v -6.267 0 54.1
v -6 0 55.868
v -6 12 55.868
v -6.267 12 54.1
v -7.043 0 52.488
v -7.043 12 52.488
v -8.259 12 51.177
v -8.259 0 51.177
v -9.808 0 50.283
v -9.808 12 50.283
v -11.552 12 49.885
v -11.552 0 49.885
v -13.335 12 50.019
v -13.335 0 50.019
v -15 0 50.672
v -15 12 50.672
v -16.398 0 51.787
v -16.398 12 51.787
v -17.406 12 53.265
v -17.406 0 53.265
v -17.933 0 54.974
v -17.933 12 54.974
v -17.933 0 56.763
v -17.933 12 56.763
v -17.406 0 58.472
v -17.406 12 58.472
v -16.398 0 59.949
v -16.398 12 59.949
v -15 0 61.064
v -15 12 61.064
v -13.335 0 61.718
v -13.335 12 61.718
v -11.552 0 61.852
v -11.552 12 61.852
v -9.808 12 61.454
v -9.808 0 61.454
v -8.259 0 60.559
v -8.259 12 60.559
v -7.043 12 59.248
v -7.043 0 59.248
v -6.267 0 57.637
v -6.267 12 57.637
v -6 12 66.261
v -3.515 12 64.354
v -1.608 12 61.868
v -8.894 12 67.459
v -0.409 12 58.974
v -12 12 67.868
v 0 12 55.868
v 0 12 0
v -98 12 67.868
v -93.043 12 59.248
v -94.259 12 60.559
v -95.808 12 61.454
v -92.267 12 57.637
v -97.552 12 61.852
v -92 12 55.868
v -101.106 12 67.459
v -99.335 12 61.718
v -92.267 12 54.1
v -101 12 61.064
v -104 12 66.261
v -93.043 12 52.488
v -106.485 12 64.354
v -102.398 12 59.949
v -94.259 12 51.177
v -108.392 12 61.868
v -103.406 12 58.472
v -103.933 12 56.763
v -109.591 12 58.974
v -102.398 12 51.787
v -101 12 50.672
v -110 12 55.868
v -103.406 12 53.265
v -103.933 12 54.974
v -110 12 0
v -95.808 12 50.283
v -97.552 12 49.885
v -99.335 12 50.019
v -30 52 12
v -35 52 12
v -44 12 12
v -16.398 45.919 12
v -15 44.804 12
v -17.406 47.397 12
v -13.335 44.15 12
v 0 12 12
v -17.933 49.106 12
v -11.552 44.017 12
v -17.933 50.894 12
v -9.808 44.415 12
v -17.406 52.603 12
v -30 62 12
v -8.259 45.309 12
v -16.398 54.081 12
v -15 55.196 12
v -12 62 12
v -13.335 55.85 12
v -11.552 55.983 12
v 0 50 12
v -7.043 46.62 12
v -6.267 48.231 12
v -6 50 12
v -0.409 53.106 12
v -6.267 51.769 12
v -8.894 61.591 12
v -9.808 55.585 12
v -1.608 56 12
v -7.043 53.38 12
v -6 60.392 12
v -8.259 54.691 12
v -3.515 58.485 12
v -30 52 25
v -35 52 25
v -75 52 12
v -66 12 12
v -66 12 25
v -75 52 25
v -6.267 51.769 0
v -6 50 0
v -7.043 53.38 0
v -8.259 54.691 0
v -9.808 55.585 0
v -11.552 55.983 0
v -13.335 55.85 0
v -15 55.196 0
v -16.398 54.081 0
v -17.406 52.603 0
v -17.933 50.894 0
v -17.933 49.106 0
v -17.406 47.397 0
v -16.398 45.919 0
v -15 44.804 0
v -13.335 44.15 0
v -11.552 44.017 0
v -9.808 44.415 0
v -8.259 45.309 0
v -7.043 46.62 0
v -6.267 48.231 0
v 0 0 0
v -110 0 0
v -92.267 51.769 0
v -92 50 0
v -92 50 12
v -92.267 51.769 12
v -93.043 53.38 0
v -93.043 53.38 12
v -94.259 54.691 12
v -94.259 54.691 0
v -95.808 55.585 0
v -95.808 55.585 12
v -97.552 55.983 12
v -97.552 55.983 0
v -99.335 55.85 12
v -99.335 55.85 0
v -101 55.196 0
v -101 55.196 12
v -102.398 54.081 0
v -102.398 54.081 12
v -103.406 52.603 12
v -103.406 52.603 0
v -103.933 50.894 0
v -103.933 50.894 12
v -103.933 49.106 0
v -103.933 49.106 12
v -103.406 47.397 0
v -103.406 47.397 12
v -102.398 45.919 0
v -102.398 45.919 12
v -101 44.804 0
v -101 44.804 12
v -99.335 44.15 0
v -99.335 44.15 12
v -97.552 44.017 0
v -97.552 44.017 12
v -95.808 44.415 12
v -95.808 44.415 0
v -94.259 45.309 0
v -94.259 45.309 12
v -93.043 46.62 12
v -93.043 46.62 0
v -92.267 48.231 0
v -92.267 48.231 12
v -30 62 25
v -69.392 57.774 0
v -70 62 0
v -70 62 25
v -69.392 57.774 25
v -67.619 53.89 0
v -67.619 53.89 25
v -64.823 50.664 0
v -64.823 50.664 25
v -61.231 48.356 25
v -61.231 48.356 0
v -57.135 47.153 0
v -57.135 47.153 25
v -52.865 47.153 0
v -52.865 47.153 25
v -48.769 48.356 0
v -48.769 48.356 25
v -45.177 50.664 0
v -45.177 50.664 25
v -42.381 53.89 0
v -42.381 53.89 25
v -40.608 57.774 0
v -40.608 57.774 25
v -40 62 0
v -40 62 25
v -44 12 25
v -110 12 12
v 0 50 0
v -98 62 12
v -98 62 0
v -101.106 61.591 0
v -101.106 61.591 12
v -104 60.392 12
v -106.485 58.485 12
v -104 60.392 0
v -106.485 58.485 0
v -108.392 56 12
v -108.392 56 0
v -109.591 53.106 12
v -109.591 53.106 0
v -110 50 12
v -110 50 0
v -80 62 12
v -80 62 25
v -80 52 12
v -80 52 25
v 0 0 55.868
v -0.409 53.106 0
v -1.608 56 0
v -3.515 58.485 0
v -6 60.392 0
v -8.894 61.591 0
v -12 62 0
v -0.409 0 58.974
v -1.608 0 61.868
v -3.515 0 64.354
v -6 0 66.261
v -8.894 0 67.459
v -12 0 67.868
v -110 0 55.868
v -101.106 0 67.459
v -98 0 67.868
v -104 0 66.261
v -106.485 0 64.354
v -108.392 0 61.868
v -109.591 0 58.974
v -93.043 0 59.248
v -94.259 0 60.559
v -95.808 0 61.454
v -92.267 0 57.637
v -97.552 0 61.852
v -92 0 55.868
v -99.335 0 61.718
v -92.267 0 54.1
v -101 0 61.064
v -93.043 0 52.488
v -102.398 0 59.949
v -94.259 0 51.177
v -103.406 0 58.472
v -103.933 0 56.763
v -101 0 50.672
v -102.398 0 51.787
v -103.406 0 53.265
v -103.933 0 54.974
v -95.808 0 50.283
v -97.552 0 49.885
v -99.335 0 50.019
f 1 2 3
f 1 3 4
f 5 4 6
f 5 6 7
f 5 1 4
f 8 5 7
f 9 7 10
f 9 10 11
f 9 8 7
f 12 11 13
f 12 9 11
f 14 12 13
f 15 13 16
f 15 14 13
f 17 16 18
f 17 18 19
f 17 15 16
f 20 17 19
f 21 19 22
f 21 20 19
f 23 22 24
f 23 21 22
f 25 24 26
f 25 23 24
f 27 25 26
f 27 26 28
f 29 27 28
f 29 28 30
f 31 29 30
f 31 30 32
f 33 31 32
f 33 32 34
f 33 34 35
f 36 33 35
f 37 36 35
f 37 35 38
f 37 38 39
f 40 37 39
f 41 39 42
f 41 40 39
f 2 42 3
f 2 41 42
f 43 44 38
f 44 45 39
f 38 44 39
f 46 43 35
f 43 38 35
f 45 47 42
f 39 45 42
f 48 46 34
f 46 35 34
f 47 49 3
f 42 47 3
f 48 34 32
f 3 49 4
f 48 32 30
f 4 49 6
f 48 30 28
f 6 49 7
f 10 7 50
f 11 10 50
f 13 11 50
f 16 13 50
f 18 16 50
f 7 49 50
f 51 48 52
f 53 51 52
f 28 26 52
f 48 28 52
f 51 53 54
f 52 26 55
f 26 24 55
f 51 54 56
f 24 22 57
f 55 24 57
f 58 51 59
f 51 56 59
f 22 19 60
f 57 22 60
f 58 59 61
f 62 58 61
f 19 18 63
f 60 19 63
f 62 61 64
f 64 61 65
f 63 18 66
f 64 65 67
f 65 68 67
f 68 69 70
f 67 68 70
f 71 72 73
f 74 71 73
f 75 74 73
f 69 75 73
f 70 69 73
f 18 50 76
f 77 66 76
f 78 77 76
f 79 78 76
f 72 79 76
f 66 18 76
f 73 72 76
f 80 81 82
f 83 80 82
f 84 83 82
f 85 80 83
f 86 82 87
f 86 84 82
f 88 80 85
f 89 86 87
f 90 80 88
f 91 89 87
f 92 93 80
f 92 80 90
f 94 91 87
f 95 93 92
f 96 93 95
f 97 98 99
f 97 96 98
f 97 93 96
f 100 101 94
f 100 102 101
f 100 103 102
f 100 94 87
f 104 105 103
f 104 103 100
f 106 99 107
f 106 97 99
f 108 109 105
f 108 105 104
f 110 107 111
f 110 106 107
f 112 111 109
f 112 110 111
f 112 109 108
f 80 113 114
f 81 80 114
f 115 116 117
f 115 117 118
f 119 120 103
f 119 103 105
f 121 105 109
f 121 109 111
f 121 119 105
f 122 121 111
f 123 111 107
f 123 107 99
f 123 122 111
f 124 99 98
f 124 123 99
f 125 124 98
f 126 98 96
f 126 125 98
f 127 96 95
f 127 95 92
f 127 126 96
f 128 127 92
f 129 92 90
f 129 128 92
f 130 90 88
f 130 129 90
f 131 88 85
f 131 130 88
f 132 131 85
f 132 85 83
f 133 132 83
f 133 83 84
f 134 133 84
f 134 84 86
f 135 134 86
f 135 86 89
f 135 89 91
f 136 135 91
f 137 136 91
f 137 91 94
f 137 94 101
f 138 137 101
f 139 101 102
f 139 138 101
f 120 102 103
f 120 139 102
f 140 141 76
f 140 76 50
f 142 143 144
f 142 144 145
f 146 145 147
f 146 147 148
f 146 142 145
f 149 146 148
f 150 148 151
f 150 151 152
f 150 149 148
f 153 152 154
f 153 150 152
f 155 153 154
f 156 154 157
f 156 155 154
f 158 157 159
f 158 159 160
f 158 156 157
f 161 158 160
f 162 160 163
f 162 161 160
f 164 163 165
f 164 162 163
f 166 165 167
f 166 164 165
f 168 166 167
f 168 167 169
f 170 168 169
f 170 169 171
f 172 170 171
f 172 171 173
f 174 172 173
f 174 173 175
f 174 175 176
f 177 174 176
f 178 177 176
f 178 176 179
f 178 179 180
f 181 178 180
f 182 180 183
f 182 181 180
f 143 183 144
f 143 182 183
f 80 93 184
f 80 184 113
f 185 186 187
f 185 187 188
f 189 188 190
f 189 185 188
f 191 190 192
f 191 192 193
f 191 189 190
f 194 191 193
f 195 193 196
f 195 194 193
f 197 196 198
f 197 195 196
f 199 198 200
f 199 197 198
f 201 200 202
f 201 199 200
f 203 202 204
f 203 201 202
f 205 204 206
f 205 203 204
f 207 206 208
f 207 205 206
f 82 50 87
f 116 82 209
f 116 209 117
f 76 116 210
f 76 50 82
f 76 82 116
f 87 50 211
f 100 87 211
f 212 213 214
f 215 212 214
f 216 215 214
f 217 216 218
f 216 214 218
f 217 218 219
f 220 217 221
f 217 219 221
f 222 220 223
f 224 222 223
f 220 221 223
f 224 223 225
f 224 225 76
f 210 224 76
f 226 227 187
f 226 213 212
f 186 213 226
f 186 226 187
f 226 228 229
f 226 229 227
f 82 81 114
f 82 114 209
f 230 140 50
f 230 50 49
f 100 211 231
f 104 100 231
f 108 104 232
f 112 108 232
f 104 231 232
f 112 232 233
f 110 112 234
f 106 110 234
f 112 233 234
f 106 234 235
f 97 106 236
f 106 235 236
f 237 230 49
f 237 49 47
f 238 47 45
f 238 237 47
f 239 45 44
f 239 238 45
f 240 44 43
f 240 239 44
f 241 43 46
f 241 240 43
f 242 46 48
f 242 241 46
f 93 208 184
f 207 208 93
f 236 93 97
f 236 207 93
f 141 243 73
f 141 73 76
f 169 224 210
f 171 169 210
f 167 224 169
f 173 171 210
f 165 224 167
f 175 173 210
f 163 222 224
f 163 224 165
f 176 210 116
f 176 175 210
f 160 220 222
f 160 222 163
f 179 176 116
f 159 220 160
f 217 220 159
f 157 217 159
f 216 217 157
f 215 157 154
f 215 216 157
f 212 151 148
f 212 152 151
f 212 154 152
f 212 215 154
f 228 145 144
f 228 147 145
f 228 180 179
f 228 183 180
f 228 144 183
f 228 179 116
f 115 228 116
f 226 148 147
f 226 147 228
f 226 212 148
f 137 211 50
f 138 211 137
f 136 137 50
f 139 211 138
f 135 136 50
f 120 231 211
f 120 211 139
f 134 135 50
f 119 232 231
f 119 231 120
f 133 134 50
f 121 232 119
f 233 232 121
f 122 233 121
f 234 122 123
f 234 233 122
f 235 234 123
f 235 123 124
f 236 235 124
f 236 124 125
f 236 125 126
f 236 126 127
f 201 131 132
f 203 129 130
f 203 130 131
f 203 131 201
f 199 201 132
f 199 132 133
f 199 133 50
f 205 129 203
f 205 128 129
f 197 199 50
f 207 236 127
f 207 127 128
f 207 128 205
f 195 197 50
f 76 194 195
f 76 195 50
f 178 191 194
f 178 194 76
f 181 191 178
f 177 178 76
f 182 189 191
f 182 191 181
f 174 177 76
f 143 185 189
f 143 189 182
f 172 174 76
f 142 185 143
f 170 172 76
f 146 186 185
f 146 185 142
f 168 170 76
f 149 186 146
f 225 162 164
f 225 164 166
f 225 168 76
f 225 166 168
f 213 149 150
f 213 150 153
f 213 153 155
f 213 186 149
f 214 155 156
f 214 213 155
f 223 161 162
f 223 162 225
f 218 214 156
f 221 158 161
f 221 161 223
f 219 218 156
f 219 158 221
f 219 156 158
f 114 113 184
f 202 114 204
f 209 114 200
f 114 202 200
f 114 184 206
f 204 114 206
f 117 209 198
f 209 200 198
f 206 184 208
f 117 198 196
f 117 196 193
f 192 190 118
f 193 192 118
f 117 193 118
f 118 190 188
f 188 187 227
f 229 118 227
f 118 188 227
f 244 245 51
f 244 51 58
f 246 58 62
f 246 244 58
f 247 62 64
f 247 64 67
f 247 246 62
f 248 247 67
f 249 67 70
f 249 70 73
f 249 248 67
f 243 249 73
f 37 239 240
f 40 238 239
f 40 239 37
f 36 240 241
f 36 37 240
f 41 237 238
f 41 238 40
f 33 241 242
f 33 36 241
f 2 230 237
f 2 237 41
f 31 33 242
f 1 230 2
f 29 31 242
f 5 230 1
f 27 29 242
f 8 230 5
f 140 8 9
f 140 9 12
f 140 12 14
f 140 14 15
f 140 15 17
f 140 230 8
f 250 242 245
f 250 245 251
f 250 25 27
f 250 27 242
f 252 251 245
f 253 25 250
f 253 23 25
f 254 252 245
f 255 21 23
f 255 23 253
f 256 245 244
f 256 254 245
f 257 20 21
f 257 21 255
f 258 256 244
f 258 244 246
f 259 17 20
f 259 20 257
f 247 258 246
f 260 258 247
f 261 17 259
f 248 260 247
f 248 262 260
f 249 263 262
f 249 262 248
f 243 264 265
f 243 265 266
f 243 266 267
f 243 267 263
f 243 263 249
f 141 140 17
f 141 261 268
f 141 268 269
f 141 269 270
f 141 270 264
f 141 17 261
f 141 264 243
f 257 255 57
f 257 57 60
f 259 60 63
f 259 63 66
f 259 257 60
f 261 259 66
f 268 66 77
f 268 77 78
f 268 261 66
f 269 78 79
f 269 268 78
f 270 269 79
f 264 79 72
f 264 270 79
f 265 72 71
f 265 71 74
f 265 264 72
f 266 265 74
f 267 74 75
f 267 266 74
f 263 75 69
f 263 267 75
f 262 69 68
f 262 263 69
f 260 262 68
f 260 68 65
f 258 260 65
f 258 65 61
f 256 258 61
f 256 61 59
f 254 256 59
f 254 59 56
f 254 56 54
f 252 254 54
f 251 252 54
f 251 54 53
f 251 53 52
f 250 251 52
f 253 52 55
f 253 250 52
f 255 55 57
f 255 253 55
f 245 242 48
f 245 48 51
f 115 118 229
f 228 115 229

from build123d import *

# Parameters (mm, degrees)
SKETCH2_R             = 6
BOSS_EXTRUDE1_DEPTH   = 12
SKETCH14_R            = 6
BOSS_EXTRUDE9_DEPTH   = 12
BOSS_EXTRUDE9_2_DEPTH = 12
BOSS_EXTRUDE10_DEPTH  = 25


with BuildPart() as part:
    # Sketch2 → Boss-Extrude1 (new body)
    with BuildSketch(Plane(origin=(0, 0, 0), x_dir=(1, 0, 0), z_dir=(0, 1, 0))):
        with BuildLine():
            Line((-12, -67.868332512), (-98, -67.868332512))
            ThreePointArc((-98, -67.868332512), (-106.485281374, -64.353613886), (-110, -55.868332512))
            Line((-110, -55.868332512), (-110, 0))
            Line((-110, 0), (0, 0))
            Line((0, 0), (0, -55.868332512))
            ThreePointArc((0, -55.868332512), (-3.514718626, -64.353613886), (-12, -67.868332512))
        make_face()
        with Locations((-98, -55.868332512)):
            Circle(SKETCH2_R, mode=Mode.SUBTRACT)
        with Locations((-12, -55.868332512)):
            Circle(SKETCH2_R, mode=Mode.SUBTRACT)
    extrude(amount=BOSS_EXTRUDE1_DEPTH)


with BuildPart() as body_2:
    # Sketch14 → Boss-Extrude9 (new body)
    with BuildSketch(Plane.XY):
        with BuildLine():
            Line((-80, 52), (-80, 62))
            Line((-80, 62), (-98, 62))
            ThreePointArc((-98, 62), (-106.485281374, 58.485281374), (-110, 50))
            Line((-110, 50), (-110, 12))
            Line((-110, 12), (-66, 12))
            Line((-66, 12), (-75, 52))
            Line((-75, 52), (-80, 52))
        make_face()
        with Locations((-98, 50)):
            Circle(SKETCH14_R, mode=Mode.SUBTRACT)
    extrude(amount=BOSS_EXTRUDE9_DEPTH)



with BuildPart() as body_3:
    # Sketch14 → Boss-Extrude9 2 (new body)
    with BuildSketch(Plane.XY):
        with BuildLine():
            Line((-12, 62), (-30, 62))
            Line((-30, 62), (-30, 52))
            Line((-30, 52), (-35, 52))
            Line((-35, 52), (-44, 12))
            Line((-44, 12), (0, 12))
            Line((0, 12), (0, 50))
            ThreePointArc((0, 50), (-3.514718626, 58.485281374), (-12, 62))
        make_face()
        with Locations((-12, 50)):
            Circle(SKETCH14_R, mode=Mode.SUBTRACT)
    extrude(amount=BOSS_EXTRUDE9_2_DEPTH)


with BuildPart() as body_2_1:
    add(body_2.part)

    add(body_3.part)  # Boss-Extrude10 merges body 3
    # Sketch14<8> → Boss-Extrude10 (add)
    with BuildSketch(Plane.XY):
        with BuildLine():
            Line((-70, 62), (-80, 62))
            Line((-80, 62), (-80, 52))
            Line((-80, 52), (-75, 52))
            Line((-75, 52), (-66, 12))
            Line((-66, 12), (-44, 12))
            Line((-44, 12), (-35, 52))
            Line((-35, 52), (-30, 52))
            Line((-30, 52), (-30, 62))
            Line((-30, 62), (-40, 62))
            ThreePointArc((-40, 62), (-55, 47), (-70, 62))
        make_face()
    extrude(amount=BOSS_EXTRUDE10_DEPTH)


solid = Compound([part.part, body_2_1.part])
